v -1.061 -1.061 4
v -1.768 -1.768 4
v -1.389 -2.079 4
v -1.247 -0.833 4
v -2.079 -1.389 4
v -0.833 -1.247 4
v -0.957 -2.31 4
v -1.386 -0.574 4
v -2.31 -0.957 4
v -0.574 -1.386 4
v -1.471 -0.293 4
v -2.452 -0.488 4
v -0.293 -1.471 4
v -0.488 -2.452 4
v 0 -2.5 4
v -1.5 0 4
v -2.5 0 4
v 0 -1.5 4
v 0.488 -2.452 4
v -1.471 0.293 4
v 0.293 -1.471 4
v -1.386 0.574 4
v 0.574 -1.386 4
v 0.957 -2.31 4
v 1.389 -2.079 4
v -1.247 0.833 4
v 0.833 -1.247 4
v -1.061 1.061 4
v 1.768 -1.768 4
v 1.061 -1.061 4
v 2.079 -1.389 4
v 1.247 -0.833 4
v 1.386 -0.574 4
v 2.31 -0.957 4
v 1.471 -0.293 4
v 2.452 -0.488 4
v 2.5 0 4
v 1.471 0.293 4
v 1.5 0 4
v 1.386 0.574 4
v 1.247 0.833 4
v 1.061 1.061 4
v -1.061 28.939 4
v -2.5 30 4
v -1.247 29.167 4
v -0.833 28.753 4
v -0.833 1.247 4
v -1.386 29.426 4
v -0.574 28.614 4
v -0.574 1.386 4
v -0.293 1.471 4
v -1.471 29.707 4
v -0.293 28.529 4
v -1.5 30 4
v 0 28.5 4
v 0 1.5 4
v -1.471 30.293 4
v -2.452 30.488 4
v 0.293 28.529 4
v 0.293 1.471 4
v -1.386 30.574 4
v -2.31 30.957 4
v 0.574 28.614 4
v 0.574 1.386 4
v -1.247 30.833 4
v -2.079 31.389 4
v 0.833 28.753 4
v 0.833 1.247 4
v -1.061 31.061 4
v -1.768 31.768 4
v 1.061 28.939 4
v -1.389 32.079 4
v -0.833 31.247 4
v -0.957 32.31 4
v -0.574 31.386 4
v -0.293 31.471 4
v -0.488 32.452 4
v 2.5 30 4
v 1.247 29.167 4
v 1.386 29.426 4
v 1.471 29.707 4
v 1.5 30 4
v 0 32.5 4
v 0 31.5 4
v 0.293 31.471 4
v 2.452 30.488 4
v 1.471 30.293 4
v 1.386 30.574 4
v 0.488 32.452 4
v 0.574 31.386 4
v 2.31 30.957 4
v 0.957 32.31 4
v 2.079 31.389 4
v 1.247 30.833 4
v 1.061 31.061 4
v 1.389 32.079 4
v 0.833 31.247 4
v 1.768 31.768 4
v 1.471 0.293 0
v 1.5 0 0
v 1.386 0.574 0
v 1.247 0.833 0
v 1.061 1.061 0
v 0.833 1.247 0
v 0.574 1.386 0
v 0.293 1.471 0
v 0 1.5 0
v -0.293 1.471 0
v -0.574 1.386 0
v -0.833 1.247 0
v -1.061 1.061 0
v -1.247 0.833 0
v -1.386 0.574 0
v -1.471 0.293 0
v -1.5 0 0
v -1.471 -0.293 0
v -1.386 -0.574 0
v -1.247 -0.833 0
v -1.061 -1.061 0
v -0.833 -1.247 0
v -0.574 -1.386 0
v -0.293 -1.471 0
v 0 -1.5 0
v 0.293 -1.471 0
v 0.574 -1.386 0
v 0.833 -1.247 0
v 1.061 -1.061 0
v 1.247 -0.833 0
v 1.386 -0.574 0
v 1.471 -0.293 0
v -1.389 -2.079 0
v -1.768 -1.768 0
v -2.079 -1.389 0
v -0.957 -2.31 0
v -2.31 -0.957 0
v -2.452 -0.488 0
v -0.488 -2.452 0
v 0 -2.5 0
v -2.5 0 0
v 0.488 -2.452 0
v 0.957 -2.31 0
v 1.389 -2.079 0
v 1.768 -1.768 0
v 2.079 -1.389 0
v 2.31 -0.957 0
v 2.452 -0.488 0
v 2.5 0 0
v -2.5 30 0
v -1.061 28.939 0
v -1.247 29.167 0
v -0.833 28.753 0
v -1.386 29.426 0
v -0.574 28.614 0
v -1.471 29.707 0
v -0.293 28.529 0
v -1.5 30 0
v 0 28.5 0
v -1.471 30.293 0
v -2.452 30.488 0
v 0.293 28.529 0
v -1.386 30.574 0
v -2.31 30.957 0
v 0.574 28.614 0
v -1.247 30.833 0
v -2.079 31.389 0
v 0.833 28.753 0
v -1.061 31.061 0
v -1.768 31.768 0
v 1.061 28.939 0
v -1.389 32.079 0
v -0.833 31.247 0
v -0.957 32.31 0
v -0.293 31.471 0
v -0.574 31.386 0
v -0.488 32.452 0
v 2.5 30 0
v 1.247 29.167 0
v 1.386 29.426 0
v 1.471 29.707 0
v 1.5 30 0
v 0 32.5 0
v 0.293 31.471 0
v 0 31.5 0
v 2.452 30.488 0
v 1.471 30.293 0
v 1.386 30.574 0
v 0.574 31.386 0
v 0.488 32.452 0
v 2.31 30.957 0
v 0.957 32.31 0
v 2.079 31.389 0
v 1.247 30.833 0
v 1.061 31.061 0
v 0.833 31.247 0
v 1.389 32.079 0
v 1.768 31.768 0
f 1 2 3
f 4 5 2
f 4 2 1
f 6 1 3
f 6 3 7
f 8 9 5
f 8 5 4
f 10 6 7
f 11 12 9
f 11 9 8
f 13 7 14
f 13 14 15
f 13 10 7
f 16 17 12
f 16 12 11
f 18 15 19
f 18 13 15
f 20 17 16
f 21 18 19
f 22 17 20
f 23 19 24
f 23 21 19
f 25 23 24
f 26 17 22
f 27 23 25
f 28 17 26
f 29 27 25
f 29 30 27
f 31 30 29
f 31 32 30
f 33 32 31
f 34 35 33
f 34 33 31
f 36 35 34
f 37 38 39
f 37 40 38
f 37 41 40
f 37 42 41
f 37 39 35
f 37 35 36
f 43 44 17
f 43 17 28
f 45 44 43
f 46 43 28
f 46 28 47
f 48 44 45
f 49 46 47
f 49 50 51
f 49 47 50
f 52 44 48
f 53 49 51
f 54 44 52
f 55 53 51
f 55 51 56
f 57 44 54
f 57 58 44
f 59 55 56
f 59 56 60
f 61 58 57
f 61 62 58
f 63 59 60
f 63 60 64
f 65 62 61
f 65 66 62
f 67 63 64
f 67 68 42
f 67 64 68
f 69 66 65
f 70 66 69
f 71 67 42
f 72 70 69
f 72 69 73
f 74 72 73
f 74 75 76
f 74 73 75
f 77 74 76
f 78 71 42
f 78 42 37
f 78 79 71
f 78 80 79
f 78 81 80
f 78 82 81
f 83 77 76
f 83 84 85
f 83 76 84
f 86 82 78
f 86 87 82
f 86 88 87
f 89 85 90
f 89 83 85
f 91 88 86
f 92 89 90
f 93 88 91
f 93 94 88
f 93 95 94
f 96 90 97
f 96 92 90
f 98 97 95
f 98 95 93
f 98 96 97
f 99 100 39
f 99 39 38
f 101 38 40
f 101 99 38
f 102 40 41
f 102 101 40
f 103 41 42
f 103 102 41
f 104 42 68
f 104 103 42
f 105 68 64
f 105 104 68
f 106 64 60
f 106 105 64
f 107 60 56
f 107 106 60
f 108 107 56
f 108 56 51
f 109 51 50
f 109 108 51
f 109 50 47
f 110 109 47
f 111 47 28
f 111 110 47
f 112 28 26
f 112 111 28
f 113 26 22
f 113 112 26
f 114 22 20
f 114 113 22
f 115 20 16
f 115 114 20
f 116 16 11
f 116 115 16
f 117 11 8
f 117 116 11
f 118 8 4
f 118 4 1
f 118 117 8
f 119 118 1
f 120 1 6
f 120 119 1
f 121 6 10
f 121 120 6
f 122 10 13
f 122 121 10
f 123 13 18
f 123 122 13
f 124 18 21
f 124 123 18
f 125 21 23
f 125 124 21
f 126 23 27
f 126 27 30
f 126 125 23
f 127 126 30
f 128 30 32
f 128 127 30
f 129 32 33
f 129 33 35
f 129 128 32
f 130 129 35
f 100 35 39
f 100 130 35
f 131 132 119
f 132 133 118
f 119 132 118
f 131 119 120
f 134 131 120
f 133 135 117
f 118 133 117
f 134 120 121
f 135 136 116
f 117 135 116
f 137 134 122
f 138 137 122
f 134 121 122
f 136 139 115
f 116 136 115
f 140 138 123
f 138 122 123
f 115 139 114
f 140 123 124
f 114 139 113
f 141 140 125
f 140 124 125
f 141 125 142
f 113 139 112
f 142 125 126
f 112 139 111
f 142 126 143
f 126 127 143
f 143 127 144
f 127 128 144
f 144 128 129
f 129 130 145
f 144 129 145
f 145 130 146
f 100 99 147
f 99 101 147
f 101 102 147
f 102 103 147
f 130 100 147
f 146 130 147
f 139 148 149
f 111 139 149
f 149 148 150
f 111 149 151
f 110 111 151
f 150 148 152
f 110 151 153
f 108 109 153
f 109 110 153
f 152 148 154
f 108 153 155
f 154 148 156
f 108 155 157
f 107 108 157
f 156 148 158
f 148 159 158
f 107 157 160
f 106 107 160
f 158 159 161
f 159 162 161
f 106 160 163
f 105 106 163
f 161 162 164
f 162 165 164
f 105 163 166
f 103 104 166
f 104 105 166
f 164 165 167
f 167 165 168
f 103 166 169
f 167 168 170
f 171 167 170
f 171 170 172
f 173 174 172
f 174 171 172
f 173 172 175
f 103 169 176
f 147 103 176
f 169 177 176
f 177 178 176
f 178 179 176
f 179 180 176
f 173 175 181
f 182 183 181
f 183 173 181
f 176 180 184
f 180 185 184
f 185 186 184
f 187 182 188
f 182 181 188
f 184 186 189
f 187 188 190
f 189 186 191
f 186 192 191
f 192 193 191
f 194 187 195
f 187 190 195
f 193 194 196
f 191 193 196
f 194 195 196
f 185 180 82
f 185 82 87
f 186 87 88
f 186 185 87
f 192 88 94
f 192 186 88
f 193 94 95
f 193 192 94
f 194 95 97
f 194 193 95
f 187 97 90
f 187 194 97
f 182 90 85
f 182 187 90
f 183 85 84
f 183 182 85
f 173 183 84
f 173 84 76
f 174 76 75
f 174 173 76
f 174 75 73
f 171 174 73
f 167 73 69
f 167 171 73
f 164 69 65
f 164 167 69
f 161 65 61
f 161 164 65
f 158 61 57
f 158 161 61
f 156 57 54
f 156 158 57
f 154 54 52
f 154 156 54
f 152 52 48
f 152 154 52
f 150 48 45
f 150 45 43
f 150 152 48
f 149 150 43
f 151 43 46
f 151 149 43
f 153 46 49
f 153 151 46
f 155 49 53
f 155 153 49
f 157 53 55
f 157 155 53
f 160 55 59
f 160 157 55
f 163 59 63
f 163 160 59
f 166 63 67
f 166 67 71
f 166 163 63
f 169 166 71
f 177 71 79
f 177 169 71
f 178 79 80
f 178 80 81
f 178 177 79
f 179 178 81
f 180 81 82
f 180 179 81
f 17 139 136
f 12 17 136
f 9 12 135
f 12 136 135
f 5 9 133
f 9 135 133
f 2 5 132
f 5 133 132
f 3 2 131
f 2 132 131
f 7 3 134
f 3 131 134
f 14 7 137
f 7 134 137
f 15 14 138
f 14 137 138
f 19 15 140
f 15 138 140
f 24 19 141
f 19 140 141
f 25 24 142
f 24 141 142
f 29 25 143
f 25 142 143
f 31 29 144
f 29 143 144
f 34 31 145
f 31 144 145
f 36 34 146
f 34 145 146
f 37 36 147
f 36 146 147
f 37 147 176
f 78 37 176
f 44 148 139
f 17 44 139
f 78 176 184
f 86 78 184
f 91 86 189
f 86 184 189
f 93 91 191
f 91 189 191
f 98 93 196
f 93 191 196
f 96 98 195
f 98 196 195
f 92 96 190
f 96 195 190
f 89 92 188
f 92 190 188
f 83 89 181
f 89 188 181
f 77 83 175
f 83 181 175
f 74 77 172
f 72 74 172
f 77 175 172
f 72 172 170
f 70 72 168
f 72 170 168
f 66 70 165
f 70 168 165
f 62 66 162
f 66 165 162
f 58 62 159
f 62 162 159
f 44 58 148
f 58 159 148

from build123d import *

# Parameters (mm, degrees)
SKIZZE1_R                       = 2.5
SKIZZE1_R_2                     = 1.5
AUFSATZ_LINEAR_AUSTRAGEN1_DEPTH = 4


with BuildPart() as part:
    # Skizze1 → Aufsatz-Linear austragen1 (new body)
    # profile 1 of 3: a face of its own
    with BuildSketch(Plane.XY):
        with Locations((0, 30)):
            Circle(SKIZZE1_R)
        with Locations((0, 30)):
            Circle(SKIZZE1_R_2, mode=Mode.SUBTRACT)
    # profile 2 of 3: a face of its own
    with BuildSketch(Plane.XY):
        with BuildLine():
            ThreePointArc((2.5, 30), (0, 27.5), (-2.5, 30))
            Line((-2.5, 30), (-2.5, 0))
            ThreePointArc((-2.5, 0), (0, 2.5), (2.5, 0))
            Line((2.5, 0), (2.5, 30))
        make_face()
    # profile 3 of 3: a face of its own
    with BuildSketch(Plane.XY):
        Circle(SKIZZE1_R)
        Circle(SKIZZE1_R_2, mode=Mode.SUBTRACT)
    extrude(amount=AUFSATZ_LINEAR_AUSTRAGEN1_DEPTH)


solid = part.part
